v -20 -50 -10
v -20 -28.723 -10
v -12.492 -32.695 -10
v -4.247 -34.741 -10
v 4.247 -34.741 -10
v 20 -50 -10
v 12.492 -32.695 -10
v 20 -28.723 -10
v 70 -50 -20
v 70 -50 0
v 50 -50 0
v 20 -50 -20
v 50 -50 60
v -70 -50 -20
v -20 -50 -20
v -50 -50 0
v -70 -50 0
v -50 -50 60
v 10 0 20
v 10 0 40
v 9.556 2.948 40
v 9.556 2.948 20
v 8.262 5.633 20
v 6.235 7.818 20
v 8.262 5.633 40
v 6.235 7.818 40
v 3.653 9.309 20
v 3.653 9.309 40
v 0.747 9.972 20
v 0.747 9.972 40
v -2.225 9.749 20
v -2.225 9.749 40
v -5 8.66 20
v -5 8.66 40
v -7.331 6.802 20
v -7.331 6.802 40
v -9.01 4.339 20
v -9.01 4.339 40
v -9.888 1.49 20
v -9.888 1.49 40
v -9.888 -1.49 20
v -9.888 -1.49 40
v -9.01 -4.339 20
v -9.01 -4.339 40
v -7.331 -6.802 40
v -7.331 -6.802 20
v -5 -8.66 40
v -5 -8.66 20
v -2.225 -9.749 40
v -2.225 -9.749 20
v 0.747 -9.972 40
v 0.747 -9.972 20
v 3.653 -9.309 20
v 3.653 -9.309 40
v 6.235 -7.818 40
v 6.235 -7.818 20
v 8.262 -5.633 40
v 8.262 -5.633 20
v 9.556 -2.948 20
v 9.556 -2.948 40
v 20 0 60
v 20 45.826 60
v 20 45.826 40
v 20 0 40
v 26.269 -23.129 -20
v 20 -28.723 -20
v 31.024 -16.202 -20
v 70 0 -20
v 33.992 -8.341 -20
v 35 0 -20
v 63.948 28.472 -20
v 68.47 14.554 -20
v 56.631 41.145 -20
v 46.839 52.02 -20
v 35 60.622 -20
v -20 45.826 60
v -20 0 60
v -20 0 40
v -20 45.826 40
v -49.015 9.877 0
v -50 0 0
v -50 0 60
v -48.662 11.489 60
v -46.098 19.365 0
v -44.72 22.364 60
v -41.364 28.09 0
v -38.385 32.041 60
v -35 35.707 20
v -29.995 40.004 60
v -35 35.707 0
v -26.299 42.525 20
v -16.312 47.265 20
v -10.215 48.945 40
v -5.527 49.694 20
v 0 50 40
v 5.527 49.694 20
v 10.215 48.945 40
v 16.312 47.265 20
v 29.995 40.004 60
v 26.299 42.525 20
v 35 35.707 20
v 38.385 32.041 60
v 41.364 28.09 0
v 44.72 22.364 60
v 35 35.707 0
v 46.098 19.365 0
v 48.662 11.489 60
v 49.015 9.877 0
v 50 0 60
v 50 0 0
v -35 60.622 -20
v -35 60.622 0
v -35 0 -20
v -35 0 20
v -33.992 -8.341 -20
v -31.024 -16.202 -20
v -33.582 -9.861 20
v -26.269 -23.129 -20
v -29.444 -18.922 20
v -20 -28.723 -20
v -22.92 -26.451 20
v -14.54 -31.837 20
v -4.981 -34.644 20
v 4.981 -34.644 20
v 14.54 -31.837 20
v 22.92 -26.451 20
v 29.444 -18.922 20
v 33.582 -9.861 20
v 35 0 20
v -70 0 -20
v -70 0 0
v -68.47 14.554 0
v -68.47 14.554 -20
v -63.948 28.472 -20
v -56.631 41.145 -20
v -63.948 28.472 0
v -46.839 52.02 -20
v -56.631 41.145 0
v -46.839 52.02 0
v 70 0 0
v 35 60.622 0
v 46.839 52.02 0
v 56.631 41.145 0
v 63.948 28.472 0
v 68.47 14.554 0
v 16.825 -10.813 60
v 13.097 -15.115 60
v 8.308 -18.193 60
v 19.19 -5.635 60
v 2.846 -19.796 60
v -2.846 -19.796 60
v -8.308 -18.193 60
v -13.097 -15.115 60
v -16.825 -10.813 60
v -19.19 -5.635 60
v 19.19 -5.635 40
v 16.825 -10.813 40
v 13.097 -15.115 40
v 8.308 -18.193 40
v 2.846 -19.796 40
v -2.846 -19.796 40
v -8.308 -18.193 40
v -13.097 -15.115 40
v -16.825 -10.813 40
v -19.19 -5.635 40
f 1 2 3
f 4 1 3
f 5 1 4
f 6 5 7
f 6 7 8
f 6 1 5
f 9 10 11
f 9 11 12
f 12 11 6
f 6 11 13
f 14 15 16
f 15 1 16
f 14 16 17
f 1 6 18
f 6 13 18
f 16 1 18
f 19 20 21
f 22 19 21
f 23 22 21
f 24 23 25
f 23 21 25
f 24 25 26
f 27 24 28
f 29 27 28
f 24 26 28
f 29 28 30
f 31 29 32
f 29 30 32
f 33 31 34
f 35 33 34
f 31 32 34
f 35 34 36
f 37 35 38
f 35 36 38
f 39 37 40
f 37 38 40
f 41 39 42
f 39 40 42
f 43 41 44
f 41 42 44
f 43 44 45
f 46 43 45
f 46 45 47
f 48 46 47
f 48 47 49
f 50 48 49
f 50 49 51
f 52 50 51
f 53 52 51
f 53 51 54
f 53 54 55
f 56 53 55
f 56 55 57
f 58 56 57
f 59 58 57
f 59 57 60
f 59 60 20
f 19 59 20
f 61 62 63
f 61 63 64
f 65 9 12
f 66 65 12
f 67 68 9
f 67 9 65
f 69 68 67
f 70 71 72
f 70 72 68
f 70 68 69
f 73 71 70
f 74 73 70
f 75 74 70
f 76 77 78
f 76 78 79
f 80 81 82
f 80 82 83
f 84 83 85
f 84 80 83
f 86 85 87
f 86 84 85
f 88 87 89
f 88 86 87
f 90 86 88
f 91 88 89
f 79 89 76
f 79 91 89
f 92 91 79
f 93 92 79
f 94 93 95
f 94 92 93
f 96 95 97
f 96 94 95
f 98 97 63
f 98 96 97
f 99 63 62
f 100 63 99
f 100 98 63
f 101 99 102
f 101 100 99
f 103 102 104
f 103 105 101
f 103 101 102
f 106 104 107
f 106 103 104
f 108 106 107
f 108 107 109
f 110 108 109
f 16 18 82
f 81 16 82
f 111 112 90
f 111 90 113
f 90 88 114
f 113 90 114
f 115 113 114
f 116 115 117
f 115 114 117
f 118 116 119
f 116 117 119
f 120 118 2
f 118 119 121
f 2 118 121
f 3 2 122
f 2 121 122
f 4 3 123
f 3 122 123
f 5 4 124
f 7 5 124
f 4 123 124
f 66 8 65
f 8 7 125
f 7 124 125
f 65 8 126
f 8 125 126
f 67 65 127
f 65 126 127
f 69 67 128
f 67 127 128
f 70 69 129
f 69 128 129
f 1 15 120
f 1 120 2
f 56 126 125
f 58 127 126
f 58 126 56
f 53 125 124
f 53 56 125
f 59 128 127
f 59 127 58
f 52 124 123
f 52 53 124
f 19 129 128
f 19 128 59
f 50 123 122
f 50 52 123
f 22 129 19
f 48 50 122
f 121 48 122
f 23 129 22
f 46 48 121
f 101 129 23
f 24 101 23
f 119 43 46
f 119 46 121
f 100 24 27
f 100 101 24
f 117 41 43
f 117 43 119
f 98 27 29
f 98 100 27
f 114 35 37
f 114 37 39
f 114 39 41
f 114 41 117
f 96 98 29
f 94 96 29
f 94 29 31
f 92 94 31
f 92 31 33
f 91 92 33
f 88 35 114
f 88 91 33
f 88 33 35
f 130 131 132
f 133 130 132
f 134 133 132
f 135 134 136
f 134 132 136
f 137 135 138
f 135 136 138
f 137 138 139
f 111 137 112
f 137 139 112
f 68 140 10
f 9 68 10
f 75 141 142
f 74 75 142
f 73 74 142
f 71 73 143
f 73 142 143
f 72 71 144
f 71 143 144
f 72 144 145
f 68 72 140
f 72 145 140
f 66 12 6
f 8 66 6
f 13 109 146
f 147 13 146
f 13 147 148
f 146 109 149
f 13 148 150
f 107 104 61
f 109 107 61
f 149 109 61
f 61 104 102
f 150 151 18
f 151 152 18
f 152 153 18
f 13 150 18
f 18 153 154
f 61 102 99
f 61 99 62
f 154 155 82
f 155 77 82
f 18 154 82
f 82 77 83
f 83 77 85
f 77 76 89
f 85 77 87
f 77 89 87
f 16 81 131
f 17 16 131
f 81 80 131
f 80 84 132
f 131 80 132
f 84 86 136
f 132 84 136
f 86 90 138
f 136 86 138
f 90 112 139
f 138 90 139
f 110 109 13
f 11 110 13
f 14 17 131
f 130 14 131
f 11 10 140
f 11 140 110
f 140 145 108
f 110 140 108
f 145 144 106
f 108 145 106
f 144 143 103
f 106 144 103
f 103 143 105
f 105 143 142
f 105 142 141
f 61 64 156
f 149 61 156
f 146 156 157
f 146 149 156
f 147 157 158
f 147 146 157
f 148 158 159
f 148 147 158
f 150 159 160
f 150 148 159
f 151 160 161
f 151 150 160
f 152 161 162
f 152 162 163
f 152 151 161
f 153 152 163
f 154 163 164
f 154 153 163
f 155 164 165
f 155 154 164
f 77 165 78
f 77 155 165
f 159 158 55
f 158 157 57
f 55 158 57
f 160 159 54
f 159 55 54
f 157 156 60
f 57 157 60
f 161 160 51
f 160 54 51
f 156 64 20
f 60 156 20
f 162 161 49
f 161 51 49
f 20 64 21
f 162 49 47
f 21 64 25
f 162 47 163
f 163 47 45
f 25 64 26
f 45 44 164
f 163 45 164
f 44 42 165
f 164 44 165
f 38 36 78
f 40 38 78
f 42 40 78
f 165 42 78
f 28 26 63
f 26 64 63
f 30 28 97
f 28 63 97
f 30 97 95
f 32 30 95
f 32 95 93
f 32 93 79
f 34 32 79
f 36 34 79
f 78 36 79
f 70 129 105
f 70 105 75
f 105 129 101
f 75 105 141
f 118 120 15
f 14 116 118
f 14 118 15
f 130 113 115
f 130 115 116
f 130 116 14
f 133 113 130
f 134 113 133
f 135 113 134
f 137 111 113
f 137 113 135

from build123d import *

# Parameters (mm, degrees)
BOSS_EXTRUDE1_DEPTH = 60
SKETCH2_R           = 10
CUT_EXTRUDE1_DEPTH  = 60
CUT_EXTRUDE2_DEPTH  = 20
SKETCH6_R           = 10
CUT_EXTRUDE6_DEPTH  = 20
BOSS_EXTRUDE2_DEPTH = 20
BOSS_EXTRUDE3_DEPTH = 20
SKETCH9_W           = 40
SKETCH9_H           = 10
CUT_EXTRUDE7_DEPTH  = 95


with BuildPart() as part:
    # Sketch1 → Boss-Extrude1 (new body)
    with BuildSketch(Plane.XY):
        with BuildLine():
            ThreePointArc((-50, 0), (0, 50), (50, 0))
            Line((50, 0), (50, -50))
            Line((50, -50), (-50, -50))
            Line((-50, -50), (-50, 0))
        make_face()
    extrude(amount=BOSS_EXTRUDE1_DEPTH)

    # Sketch2 → Cut-Extrude1 (cut)
    with BuildSketch(Plane.XY.offset(60)):
        Circle(SKETCH2_R)
    extrude(amount=-CUT_EXTRUDE1_DEPTH, mode=Mode.SUBTRACT)

    # Sketch3 → Cut-Extrude2 (cut)
    with BuildSketch(Plane.XY.offset(60)):
        with BuildLine():
            Line((-20, 0), (-20, 45.82575695))
            ThreePointArc((-20, 45.82575695), (0, 50), (20, 45.82575695))
            Line((20, 45.82575695), (20, 0))
            ThreePointArc((20, 0), (0, -20), (-20, 0))
        make_face()
    extrude(amount=-CUT_EXTRUDE2_DEPTH, mode=Mode.SUBTRACT)

    # Sketch6 → Cut-Extrude6 (cut)
    with BuildSketch(Plane(origin=(0, 0, 0), x_dir=(-1, 0, 0), z_dir=(0, 0, -1))):
        with BuildLine():
            Line((-35, 35.707142143), (-35, 0))
            ThreePointArc((-35, 0), (0, -35), (35, 0))
            Line((35, 0), (35, 35.707142143))
            ThreePointArc((35, 35.707142143), (0, 50), (-35, 35.707142143))
        make_face()
        Circle(SKETCH6_R, mode=Mode.SUBTRACT)
    extrude(amount=-CUT_EXTRUDE6_DEPTH, mode=Mode.SUBTRACT)

    # Sketch7 → Boss-Extrude2 (add)
    with BuildSketch(Plane(origin=(0, 0, 0), x_dir=(-1, 0, 0), z_dir=(0, 0, -1))):
        with BuildLine():
            Line((-70, -50), (-50, -50))
            Line((-50, -50), (-50, 0))
            ThreePointArc((-50, 0), (-46.097722286, 19.364916731), (-35, 35.707142143))
            Line((-35, 35.707142143), (-35, 60.621778265))
            ThreePointArc((-35, 60.621778265), (-60.621778265, 35), (-70, 0))
            Line((-70, 0), (-70, -50))
        make_face()
        with BuildLine():
            Line((-50, -50), (-35, -50))
            Line((-35, -50), (-35, 0))
            Line((-35, 0), (-35, 35.707142143))
            ThreePointArc((-35, 35.707142143), (-46.097722286, 19.364916731), (-50, 0))
            Line((-50, 0), (-50, -50))
        make_face()
        with BuildLine():
            ThreePointArc((50, 0), (46.097722286, 19.364916731), (35, 35.707142143))
            Line((35, 35.707142143), (35, 0))
            Line((35, 0), (35, -50))
            Line((35, -50), (50, -50))
            Line((50, -50), (50, 0))
        make_face()
        with BuildLine():
            ThreePointArc((70, 0), (60.621778265, 35), (35, 60.621778265))
            Line((35, 60.621778265), (35, 35.707142143))
            ThreePointArc((35, 35.707142143), (46.097722286, 19.364916731), (50, 0))
            Line((50, 0), (50, -50))
            Line((50, -50), (70, -50))
            Line((70, -50), (70, 0))
        make_face()
    extrude(amount=BOSS_EXTRUDE2_DEPTH)

    # Sketch8 → Boss-Extrude3 (add)
    with BuildSketch(Plane(origin=(0, 0, 0), x_dir=(-1, 0, 0), z_dir=(0, 0, -1))):
        with BuildLine():
            Line((-35, -50), (35, -50))
            Line((35, -50), (35, 0))
            ThreePointArc((35, 0), (0, -35), (-35, 0))
            Line((-35, 0), (-35, -50))
        make_face()
    extrude(amount=BOSS_EXTRUDE3_DEPTH)

    # Sketch9 → Cut-Extrude7 (cut)
    with BuildSketch(Plane.XZ.offset(50)):
        with Locations((0, -15)):
            Rectangle(SKETCH9_W, SKETCH9_H)
    extrude(amount=-CUT_EXTRUDE7_DEPTH, mode=Mode.SUBTRACT)


solid = part.part
